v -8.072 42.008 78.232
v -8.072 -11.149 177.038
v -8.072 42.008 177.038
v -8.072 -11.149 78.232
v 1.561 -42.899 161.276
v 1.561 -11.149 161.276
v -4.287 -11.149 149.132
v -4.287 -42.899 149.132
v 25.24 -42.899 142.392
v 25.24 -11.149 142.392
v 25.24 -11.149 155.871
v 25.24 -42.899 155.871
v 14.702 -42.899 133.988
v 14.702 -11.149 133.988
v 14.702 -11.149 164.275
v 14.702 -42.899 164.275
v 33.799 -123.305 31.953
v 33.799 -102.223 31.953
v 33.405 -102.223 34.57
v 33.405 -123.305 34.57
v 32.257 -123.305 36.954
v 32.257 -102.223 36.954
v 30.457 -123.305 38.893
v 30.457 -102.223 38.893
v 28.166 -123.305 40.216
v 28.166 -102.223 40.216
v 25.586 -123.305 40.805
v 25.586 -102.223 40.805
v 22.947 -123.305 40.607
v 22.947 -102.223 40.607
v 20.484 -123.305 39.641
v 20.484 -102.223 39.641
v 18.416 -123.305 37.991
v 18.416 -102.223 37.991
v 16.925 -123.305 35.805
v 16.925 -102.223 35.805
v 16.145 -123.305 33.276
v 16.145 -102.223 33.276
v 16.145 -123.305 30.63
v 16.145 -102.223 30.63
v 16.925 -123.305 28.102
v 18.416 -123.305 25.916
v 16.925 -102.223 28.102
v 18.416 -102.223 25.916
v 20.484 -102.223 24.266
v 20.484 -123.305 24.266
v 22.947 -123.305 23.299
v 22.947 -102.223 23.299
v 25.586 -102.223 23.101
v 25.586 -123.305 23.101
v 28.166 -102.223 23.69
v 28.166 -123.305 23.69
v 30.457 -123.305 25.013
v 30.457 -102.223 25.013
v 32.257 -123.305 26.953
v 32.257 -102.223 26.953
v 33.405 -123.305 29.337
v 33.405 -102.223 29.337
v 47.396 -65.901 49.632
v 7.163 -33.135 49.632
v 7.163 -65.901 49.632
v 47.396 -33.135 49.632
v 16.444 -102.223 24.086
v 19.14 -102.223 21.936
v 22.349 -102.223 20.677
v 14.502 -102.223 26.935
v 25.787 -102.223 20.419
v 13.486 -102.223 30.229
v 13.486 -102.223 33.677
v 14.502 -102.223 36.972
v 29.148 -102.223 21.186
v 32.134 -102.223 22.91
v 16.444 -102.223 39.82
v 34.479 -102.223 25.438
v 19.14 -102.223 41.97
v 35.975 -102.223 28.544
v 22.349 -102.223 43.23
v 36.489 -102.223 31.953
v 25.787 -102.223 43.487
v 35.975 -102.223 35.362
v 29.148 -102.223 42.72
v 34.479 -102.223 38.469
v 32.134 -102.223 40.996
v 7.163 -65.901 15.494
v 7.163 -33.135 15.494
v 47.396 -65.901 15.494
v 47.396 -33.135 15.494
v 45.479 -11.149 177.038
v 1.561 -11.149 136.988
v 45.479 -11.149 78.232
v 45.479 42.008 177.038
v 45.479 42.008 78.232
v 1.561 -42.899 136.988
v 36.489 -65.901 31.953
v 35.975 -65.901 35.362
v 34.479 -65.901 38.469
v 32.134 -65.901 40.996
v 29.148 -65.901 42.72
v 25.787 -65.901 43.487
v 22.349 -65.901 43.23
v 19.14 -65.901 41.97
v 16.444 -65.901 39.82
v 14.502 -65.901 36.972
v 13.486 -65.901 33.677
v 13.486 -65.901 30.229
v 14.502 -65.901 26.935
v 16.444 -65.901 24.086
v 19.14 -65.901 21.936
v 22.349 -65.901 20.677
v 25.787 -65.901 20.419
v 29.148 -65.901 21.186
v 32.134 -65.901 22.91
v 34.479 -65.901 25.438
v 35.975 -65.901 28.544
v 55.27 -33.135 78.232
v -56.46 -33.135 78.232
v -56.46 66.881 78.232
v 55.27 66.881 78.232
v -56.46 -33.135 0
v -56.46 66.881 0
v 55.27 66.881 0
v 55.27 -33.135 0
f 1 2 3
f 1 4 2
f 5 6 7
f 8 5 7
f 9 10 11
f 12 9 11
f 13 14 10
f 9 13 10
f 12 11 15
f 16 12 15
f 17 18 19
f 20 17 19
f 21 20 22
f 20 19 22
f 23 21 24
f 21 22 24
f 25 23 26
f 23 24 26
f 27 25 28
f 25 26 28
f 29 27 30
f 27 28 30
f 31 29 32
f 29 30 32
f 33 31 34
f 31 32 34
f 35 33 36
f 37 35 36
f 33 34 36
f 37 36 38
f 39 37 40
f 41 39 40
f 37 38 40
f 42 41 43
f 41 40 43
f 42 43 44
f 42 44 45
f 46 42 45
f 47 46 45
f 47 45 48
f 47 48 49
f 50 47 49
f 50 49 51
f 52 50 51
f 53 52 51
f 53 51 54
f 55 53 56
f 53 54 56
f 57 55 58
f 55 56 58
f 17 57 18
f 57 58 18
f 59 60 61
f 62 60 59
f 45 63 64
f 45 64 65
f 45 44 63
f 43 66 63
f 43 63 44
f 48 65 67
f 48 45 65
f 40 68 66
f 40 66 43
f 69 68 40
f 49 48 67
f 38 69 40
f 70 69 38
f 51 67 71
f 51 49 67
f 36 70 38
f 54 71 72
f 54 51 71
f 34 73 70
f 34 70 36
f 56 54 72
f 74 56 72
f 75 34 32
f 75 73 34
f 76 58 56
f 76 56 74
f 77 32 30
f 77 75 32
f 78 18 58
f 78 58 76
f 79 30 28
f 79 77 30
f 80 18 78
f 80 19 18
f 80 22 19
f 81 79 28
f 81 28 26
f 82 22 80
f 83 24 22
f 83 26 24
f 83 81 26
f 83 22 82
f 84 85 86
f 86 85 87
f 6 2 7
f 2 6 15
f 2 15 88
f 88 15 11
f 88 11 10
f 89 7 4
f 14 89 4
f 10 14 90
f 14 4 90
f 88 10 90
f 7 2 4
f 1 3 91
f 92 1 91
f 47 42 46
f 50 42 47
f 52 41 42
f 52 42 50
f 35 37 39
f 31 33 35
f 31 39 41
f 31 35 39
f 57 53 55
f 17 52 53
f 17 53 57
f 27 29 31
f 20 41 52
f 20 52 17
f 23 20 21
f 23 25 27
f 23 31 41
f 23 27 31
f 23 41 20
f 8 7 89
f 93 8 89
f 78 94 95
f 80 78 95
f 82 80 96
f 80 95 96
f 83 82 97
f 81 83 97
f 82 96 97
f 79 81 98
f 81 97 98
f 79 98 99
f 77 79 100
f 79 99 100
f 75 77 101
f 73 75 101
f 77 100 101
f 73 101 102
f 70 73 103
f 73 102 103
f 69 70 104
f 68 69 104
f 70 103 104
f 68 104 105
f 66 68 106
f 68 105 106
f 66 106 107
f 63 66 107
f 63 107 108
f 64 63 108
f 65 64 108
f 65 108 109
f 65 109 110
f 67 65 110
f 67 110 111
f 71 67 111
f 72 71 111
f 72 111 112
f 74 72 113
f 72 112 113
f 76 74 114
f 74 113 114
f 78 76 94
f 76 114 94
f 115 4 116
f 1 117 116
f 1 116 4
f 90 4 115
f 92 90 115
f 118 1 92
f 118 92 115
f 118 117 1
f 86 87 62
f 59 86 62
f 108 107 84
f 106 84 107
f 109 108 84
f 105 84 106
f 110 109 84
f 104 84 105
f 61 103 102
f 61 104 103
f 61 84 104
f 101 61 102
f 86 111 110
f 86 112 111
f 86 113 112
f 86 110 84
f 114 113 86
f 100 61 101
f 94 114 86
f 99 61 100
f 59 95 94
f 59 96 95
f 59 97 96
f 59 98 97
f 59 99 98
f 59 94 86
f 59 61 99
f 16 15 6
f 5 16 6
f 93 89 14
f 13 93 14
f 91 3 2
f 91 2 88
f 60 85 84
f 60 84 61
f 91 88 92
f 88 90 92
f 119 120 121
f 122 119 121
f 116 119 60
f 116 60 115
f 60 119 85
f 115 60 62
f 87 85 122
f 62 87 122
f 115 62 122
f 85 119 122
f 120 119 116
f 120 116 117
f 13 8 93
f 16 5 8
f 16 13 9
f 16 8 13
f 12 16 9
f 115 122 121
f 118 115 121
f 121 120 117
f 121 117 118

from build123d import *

# Parameters (mm, degrees)
F0_W      = 111.730128
F0_H      = 100.016385
F1_DEPTH  = 78.232
F2_W      = 40.233598
F2_H      = 34.137598
F3_DEPTH  = 32.766
F4_R      = 11.566348
F5_DEPTH  = 36.322
F6_R      = 8.876558
F7_DEPTH  = 21.082
F8_W      = 53.551454
F8_H      = 53.157688
F9_DEPTH  = 38.862
F9_FACE_W = 53.551454
F9_FACE_H = 53.157688
F10_DEPTH = 59.944
F12_DEPTH = 31.75


with BuildPart() as f1:
    # F0 (on Top) → F1 (new body)
    with BuildSketch(Plane.XY):
        with Locations((-0.595264, 16.872793)):
            Rectangle(F0_W, F0_H)
    extrude(amount=F1_DEPTH)

    # F2 (on face) → F3 (join)
    with BuildSketch(Plane.XZ.offset(33.135399)):
        with Locations((27.2796, 32.562797)):
            Rectangle(F2_W, F2_H)
    extrude(amount=F3_DEPTH)

    # F4 (on face) → F5 (join)
    with BuildSketch(Plane.XZ.offset(65.901399)):
        with Locations((24.922676, 31.953197)):
            Circle(F4_R)
    extrude(amount=F5_DEPTH)

    # F6 (on face) → F7 (join)
    with BuildSketch(Plane.XZ.offset(102.223399)):
        with Locations((24.922676, 31.953197)):
            Circle(F6_R)
    extrude(amount=F7_DEPTH)

    # F8 (on face) → F9 (join)
    with BuildSketch(Plane.XY.offset(78.232)):
        with Locations((18.703634, 15.429604)):
            Rectangle(F8_W, F8_H)
    extrude(amount=F9_DEPTH)

    # F9_face (on face) → F10 (join)
    with BuildSketch(Plane(origin=(18.703634, 15.429604, 117.094), x_dir=(1, 0, 0), z_dir=(0, 0, 1))):
        Rectangle(F9_FACE_W, F9_FACE_H)
    extrude(amount=F10_DEPTH)

    # F11 (on face) → F12 (join)
    with BuildSketch(Plane.XZ.offset(11.14924)):
        Polygon((25.2405, 142.392326), (25.2405, 155.871343), (14.70218, 164.275372), (1.561111, 161.276009), (-4.287215, 149.131835), (1.561111, 136.98766), (14.70218, 133.988297), align=None)
    extrude(amount=F12_DEPTH)


solid = f1.part
